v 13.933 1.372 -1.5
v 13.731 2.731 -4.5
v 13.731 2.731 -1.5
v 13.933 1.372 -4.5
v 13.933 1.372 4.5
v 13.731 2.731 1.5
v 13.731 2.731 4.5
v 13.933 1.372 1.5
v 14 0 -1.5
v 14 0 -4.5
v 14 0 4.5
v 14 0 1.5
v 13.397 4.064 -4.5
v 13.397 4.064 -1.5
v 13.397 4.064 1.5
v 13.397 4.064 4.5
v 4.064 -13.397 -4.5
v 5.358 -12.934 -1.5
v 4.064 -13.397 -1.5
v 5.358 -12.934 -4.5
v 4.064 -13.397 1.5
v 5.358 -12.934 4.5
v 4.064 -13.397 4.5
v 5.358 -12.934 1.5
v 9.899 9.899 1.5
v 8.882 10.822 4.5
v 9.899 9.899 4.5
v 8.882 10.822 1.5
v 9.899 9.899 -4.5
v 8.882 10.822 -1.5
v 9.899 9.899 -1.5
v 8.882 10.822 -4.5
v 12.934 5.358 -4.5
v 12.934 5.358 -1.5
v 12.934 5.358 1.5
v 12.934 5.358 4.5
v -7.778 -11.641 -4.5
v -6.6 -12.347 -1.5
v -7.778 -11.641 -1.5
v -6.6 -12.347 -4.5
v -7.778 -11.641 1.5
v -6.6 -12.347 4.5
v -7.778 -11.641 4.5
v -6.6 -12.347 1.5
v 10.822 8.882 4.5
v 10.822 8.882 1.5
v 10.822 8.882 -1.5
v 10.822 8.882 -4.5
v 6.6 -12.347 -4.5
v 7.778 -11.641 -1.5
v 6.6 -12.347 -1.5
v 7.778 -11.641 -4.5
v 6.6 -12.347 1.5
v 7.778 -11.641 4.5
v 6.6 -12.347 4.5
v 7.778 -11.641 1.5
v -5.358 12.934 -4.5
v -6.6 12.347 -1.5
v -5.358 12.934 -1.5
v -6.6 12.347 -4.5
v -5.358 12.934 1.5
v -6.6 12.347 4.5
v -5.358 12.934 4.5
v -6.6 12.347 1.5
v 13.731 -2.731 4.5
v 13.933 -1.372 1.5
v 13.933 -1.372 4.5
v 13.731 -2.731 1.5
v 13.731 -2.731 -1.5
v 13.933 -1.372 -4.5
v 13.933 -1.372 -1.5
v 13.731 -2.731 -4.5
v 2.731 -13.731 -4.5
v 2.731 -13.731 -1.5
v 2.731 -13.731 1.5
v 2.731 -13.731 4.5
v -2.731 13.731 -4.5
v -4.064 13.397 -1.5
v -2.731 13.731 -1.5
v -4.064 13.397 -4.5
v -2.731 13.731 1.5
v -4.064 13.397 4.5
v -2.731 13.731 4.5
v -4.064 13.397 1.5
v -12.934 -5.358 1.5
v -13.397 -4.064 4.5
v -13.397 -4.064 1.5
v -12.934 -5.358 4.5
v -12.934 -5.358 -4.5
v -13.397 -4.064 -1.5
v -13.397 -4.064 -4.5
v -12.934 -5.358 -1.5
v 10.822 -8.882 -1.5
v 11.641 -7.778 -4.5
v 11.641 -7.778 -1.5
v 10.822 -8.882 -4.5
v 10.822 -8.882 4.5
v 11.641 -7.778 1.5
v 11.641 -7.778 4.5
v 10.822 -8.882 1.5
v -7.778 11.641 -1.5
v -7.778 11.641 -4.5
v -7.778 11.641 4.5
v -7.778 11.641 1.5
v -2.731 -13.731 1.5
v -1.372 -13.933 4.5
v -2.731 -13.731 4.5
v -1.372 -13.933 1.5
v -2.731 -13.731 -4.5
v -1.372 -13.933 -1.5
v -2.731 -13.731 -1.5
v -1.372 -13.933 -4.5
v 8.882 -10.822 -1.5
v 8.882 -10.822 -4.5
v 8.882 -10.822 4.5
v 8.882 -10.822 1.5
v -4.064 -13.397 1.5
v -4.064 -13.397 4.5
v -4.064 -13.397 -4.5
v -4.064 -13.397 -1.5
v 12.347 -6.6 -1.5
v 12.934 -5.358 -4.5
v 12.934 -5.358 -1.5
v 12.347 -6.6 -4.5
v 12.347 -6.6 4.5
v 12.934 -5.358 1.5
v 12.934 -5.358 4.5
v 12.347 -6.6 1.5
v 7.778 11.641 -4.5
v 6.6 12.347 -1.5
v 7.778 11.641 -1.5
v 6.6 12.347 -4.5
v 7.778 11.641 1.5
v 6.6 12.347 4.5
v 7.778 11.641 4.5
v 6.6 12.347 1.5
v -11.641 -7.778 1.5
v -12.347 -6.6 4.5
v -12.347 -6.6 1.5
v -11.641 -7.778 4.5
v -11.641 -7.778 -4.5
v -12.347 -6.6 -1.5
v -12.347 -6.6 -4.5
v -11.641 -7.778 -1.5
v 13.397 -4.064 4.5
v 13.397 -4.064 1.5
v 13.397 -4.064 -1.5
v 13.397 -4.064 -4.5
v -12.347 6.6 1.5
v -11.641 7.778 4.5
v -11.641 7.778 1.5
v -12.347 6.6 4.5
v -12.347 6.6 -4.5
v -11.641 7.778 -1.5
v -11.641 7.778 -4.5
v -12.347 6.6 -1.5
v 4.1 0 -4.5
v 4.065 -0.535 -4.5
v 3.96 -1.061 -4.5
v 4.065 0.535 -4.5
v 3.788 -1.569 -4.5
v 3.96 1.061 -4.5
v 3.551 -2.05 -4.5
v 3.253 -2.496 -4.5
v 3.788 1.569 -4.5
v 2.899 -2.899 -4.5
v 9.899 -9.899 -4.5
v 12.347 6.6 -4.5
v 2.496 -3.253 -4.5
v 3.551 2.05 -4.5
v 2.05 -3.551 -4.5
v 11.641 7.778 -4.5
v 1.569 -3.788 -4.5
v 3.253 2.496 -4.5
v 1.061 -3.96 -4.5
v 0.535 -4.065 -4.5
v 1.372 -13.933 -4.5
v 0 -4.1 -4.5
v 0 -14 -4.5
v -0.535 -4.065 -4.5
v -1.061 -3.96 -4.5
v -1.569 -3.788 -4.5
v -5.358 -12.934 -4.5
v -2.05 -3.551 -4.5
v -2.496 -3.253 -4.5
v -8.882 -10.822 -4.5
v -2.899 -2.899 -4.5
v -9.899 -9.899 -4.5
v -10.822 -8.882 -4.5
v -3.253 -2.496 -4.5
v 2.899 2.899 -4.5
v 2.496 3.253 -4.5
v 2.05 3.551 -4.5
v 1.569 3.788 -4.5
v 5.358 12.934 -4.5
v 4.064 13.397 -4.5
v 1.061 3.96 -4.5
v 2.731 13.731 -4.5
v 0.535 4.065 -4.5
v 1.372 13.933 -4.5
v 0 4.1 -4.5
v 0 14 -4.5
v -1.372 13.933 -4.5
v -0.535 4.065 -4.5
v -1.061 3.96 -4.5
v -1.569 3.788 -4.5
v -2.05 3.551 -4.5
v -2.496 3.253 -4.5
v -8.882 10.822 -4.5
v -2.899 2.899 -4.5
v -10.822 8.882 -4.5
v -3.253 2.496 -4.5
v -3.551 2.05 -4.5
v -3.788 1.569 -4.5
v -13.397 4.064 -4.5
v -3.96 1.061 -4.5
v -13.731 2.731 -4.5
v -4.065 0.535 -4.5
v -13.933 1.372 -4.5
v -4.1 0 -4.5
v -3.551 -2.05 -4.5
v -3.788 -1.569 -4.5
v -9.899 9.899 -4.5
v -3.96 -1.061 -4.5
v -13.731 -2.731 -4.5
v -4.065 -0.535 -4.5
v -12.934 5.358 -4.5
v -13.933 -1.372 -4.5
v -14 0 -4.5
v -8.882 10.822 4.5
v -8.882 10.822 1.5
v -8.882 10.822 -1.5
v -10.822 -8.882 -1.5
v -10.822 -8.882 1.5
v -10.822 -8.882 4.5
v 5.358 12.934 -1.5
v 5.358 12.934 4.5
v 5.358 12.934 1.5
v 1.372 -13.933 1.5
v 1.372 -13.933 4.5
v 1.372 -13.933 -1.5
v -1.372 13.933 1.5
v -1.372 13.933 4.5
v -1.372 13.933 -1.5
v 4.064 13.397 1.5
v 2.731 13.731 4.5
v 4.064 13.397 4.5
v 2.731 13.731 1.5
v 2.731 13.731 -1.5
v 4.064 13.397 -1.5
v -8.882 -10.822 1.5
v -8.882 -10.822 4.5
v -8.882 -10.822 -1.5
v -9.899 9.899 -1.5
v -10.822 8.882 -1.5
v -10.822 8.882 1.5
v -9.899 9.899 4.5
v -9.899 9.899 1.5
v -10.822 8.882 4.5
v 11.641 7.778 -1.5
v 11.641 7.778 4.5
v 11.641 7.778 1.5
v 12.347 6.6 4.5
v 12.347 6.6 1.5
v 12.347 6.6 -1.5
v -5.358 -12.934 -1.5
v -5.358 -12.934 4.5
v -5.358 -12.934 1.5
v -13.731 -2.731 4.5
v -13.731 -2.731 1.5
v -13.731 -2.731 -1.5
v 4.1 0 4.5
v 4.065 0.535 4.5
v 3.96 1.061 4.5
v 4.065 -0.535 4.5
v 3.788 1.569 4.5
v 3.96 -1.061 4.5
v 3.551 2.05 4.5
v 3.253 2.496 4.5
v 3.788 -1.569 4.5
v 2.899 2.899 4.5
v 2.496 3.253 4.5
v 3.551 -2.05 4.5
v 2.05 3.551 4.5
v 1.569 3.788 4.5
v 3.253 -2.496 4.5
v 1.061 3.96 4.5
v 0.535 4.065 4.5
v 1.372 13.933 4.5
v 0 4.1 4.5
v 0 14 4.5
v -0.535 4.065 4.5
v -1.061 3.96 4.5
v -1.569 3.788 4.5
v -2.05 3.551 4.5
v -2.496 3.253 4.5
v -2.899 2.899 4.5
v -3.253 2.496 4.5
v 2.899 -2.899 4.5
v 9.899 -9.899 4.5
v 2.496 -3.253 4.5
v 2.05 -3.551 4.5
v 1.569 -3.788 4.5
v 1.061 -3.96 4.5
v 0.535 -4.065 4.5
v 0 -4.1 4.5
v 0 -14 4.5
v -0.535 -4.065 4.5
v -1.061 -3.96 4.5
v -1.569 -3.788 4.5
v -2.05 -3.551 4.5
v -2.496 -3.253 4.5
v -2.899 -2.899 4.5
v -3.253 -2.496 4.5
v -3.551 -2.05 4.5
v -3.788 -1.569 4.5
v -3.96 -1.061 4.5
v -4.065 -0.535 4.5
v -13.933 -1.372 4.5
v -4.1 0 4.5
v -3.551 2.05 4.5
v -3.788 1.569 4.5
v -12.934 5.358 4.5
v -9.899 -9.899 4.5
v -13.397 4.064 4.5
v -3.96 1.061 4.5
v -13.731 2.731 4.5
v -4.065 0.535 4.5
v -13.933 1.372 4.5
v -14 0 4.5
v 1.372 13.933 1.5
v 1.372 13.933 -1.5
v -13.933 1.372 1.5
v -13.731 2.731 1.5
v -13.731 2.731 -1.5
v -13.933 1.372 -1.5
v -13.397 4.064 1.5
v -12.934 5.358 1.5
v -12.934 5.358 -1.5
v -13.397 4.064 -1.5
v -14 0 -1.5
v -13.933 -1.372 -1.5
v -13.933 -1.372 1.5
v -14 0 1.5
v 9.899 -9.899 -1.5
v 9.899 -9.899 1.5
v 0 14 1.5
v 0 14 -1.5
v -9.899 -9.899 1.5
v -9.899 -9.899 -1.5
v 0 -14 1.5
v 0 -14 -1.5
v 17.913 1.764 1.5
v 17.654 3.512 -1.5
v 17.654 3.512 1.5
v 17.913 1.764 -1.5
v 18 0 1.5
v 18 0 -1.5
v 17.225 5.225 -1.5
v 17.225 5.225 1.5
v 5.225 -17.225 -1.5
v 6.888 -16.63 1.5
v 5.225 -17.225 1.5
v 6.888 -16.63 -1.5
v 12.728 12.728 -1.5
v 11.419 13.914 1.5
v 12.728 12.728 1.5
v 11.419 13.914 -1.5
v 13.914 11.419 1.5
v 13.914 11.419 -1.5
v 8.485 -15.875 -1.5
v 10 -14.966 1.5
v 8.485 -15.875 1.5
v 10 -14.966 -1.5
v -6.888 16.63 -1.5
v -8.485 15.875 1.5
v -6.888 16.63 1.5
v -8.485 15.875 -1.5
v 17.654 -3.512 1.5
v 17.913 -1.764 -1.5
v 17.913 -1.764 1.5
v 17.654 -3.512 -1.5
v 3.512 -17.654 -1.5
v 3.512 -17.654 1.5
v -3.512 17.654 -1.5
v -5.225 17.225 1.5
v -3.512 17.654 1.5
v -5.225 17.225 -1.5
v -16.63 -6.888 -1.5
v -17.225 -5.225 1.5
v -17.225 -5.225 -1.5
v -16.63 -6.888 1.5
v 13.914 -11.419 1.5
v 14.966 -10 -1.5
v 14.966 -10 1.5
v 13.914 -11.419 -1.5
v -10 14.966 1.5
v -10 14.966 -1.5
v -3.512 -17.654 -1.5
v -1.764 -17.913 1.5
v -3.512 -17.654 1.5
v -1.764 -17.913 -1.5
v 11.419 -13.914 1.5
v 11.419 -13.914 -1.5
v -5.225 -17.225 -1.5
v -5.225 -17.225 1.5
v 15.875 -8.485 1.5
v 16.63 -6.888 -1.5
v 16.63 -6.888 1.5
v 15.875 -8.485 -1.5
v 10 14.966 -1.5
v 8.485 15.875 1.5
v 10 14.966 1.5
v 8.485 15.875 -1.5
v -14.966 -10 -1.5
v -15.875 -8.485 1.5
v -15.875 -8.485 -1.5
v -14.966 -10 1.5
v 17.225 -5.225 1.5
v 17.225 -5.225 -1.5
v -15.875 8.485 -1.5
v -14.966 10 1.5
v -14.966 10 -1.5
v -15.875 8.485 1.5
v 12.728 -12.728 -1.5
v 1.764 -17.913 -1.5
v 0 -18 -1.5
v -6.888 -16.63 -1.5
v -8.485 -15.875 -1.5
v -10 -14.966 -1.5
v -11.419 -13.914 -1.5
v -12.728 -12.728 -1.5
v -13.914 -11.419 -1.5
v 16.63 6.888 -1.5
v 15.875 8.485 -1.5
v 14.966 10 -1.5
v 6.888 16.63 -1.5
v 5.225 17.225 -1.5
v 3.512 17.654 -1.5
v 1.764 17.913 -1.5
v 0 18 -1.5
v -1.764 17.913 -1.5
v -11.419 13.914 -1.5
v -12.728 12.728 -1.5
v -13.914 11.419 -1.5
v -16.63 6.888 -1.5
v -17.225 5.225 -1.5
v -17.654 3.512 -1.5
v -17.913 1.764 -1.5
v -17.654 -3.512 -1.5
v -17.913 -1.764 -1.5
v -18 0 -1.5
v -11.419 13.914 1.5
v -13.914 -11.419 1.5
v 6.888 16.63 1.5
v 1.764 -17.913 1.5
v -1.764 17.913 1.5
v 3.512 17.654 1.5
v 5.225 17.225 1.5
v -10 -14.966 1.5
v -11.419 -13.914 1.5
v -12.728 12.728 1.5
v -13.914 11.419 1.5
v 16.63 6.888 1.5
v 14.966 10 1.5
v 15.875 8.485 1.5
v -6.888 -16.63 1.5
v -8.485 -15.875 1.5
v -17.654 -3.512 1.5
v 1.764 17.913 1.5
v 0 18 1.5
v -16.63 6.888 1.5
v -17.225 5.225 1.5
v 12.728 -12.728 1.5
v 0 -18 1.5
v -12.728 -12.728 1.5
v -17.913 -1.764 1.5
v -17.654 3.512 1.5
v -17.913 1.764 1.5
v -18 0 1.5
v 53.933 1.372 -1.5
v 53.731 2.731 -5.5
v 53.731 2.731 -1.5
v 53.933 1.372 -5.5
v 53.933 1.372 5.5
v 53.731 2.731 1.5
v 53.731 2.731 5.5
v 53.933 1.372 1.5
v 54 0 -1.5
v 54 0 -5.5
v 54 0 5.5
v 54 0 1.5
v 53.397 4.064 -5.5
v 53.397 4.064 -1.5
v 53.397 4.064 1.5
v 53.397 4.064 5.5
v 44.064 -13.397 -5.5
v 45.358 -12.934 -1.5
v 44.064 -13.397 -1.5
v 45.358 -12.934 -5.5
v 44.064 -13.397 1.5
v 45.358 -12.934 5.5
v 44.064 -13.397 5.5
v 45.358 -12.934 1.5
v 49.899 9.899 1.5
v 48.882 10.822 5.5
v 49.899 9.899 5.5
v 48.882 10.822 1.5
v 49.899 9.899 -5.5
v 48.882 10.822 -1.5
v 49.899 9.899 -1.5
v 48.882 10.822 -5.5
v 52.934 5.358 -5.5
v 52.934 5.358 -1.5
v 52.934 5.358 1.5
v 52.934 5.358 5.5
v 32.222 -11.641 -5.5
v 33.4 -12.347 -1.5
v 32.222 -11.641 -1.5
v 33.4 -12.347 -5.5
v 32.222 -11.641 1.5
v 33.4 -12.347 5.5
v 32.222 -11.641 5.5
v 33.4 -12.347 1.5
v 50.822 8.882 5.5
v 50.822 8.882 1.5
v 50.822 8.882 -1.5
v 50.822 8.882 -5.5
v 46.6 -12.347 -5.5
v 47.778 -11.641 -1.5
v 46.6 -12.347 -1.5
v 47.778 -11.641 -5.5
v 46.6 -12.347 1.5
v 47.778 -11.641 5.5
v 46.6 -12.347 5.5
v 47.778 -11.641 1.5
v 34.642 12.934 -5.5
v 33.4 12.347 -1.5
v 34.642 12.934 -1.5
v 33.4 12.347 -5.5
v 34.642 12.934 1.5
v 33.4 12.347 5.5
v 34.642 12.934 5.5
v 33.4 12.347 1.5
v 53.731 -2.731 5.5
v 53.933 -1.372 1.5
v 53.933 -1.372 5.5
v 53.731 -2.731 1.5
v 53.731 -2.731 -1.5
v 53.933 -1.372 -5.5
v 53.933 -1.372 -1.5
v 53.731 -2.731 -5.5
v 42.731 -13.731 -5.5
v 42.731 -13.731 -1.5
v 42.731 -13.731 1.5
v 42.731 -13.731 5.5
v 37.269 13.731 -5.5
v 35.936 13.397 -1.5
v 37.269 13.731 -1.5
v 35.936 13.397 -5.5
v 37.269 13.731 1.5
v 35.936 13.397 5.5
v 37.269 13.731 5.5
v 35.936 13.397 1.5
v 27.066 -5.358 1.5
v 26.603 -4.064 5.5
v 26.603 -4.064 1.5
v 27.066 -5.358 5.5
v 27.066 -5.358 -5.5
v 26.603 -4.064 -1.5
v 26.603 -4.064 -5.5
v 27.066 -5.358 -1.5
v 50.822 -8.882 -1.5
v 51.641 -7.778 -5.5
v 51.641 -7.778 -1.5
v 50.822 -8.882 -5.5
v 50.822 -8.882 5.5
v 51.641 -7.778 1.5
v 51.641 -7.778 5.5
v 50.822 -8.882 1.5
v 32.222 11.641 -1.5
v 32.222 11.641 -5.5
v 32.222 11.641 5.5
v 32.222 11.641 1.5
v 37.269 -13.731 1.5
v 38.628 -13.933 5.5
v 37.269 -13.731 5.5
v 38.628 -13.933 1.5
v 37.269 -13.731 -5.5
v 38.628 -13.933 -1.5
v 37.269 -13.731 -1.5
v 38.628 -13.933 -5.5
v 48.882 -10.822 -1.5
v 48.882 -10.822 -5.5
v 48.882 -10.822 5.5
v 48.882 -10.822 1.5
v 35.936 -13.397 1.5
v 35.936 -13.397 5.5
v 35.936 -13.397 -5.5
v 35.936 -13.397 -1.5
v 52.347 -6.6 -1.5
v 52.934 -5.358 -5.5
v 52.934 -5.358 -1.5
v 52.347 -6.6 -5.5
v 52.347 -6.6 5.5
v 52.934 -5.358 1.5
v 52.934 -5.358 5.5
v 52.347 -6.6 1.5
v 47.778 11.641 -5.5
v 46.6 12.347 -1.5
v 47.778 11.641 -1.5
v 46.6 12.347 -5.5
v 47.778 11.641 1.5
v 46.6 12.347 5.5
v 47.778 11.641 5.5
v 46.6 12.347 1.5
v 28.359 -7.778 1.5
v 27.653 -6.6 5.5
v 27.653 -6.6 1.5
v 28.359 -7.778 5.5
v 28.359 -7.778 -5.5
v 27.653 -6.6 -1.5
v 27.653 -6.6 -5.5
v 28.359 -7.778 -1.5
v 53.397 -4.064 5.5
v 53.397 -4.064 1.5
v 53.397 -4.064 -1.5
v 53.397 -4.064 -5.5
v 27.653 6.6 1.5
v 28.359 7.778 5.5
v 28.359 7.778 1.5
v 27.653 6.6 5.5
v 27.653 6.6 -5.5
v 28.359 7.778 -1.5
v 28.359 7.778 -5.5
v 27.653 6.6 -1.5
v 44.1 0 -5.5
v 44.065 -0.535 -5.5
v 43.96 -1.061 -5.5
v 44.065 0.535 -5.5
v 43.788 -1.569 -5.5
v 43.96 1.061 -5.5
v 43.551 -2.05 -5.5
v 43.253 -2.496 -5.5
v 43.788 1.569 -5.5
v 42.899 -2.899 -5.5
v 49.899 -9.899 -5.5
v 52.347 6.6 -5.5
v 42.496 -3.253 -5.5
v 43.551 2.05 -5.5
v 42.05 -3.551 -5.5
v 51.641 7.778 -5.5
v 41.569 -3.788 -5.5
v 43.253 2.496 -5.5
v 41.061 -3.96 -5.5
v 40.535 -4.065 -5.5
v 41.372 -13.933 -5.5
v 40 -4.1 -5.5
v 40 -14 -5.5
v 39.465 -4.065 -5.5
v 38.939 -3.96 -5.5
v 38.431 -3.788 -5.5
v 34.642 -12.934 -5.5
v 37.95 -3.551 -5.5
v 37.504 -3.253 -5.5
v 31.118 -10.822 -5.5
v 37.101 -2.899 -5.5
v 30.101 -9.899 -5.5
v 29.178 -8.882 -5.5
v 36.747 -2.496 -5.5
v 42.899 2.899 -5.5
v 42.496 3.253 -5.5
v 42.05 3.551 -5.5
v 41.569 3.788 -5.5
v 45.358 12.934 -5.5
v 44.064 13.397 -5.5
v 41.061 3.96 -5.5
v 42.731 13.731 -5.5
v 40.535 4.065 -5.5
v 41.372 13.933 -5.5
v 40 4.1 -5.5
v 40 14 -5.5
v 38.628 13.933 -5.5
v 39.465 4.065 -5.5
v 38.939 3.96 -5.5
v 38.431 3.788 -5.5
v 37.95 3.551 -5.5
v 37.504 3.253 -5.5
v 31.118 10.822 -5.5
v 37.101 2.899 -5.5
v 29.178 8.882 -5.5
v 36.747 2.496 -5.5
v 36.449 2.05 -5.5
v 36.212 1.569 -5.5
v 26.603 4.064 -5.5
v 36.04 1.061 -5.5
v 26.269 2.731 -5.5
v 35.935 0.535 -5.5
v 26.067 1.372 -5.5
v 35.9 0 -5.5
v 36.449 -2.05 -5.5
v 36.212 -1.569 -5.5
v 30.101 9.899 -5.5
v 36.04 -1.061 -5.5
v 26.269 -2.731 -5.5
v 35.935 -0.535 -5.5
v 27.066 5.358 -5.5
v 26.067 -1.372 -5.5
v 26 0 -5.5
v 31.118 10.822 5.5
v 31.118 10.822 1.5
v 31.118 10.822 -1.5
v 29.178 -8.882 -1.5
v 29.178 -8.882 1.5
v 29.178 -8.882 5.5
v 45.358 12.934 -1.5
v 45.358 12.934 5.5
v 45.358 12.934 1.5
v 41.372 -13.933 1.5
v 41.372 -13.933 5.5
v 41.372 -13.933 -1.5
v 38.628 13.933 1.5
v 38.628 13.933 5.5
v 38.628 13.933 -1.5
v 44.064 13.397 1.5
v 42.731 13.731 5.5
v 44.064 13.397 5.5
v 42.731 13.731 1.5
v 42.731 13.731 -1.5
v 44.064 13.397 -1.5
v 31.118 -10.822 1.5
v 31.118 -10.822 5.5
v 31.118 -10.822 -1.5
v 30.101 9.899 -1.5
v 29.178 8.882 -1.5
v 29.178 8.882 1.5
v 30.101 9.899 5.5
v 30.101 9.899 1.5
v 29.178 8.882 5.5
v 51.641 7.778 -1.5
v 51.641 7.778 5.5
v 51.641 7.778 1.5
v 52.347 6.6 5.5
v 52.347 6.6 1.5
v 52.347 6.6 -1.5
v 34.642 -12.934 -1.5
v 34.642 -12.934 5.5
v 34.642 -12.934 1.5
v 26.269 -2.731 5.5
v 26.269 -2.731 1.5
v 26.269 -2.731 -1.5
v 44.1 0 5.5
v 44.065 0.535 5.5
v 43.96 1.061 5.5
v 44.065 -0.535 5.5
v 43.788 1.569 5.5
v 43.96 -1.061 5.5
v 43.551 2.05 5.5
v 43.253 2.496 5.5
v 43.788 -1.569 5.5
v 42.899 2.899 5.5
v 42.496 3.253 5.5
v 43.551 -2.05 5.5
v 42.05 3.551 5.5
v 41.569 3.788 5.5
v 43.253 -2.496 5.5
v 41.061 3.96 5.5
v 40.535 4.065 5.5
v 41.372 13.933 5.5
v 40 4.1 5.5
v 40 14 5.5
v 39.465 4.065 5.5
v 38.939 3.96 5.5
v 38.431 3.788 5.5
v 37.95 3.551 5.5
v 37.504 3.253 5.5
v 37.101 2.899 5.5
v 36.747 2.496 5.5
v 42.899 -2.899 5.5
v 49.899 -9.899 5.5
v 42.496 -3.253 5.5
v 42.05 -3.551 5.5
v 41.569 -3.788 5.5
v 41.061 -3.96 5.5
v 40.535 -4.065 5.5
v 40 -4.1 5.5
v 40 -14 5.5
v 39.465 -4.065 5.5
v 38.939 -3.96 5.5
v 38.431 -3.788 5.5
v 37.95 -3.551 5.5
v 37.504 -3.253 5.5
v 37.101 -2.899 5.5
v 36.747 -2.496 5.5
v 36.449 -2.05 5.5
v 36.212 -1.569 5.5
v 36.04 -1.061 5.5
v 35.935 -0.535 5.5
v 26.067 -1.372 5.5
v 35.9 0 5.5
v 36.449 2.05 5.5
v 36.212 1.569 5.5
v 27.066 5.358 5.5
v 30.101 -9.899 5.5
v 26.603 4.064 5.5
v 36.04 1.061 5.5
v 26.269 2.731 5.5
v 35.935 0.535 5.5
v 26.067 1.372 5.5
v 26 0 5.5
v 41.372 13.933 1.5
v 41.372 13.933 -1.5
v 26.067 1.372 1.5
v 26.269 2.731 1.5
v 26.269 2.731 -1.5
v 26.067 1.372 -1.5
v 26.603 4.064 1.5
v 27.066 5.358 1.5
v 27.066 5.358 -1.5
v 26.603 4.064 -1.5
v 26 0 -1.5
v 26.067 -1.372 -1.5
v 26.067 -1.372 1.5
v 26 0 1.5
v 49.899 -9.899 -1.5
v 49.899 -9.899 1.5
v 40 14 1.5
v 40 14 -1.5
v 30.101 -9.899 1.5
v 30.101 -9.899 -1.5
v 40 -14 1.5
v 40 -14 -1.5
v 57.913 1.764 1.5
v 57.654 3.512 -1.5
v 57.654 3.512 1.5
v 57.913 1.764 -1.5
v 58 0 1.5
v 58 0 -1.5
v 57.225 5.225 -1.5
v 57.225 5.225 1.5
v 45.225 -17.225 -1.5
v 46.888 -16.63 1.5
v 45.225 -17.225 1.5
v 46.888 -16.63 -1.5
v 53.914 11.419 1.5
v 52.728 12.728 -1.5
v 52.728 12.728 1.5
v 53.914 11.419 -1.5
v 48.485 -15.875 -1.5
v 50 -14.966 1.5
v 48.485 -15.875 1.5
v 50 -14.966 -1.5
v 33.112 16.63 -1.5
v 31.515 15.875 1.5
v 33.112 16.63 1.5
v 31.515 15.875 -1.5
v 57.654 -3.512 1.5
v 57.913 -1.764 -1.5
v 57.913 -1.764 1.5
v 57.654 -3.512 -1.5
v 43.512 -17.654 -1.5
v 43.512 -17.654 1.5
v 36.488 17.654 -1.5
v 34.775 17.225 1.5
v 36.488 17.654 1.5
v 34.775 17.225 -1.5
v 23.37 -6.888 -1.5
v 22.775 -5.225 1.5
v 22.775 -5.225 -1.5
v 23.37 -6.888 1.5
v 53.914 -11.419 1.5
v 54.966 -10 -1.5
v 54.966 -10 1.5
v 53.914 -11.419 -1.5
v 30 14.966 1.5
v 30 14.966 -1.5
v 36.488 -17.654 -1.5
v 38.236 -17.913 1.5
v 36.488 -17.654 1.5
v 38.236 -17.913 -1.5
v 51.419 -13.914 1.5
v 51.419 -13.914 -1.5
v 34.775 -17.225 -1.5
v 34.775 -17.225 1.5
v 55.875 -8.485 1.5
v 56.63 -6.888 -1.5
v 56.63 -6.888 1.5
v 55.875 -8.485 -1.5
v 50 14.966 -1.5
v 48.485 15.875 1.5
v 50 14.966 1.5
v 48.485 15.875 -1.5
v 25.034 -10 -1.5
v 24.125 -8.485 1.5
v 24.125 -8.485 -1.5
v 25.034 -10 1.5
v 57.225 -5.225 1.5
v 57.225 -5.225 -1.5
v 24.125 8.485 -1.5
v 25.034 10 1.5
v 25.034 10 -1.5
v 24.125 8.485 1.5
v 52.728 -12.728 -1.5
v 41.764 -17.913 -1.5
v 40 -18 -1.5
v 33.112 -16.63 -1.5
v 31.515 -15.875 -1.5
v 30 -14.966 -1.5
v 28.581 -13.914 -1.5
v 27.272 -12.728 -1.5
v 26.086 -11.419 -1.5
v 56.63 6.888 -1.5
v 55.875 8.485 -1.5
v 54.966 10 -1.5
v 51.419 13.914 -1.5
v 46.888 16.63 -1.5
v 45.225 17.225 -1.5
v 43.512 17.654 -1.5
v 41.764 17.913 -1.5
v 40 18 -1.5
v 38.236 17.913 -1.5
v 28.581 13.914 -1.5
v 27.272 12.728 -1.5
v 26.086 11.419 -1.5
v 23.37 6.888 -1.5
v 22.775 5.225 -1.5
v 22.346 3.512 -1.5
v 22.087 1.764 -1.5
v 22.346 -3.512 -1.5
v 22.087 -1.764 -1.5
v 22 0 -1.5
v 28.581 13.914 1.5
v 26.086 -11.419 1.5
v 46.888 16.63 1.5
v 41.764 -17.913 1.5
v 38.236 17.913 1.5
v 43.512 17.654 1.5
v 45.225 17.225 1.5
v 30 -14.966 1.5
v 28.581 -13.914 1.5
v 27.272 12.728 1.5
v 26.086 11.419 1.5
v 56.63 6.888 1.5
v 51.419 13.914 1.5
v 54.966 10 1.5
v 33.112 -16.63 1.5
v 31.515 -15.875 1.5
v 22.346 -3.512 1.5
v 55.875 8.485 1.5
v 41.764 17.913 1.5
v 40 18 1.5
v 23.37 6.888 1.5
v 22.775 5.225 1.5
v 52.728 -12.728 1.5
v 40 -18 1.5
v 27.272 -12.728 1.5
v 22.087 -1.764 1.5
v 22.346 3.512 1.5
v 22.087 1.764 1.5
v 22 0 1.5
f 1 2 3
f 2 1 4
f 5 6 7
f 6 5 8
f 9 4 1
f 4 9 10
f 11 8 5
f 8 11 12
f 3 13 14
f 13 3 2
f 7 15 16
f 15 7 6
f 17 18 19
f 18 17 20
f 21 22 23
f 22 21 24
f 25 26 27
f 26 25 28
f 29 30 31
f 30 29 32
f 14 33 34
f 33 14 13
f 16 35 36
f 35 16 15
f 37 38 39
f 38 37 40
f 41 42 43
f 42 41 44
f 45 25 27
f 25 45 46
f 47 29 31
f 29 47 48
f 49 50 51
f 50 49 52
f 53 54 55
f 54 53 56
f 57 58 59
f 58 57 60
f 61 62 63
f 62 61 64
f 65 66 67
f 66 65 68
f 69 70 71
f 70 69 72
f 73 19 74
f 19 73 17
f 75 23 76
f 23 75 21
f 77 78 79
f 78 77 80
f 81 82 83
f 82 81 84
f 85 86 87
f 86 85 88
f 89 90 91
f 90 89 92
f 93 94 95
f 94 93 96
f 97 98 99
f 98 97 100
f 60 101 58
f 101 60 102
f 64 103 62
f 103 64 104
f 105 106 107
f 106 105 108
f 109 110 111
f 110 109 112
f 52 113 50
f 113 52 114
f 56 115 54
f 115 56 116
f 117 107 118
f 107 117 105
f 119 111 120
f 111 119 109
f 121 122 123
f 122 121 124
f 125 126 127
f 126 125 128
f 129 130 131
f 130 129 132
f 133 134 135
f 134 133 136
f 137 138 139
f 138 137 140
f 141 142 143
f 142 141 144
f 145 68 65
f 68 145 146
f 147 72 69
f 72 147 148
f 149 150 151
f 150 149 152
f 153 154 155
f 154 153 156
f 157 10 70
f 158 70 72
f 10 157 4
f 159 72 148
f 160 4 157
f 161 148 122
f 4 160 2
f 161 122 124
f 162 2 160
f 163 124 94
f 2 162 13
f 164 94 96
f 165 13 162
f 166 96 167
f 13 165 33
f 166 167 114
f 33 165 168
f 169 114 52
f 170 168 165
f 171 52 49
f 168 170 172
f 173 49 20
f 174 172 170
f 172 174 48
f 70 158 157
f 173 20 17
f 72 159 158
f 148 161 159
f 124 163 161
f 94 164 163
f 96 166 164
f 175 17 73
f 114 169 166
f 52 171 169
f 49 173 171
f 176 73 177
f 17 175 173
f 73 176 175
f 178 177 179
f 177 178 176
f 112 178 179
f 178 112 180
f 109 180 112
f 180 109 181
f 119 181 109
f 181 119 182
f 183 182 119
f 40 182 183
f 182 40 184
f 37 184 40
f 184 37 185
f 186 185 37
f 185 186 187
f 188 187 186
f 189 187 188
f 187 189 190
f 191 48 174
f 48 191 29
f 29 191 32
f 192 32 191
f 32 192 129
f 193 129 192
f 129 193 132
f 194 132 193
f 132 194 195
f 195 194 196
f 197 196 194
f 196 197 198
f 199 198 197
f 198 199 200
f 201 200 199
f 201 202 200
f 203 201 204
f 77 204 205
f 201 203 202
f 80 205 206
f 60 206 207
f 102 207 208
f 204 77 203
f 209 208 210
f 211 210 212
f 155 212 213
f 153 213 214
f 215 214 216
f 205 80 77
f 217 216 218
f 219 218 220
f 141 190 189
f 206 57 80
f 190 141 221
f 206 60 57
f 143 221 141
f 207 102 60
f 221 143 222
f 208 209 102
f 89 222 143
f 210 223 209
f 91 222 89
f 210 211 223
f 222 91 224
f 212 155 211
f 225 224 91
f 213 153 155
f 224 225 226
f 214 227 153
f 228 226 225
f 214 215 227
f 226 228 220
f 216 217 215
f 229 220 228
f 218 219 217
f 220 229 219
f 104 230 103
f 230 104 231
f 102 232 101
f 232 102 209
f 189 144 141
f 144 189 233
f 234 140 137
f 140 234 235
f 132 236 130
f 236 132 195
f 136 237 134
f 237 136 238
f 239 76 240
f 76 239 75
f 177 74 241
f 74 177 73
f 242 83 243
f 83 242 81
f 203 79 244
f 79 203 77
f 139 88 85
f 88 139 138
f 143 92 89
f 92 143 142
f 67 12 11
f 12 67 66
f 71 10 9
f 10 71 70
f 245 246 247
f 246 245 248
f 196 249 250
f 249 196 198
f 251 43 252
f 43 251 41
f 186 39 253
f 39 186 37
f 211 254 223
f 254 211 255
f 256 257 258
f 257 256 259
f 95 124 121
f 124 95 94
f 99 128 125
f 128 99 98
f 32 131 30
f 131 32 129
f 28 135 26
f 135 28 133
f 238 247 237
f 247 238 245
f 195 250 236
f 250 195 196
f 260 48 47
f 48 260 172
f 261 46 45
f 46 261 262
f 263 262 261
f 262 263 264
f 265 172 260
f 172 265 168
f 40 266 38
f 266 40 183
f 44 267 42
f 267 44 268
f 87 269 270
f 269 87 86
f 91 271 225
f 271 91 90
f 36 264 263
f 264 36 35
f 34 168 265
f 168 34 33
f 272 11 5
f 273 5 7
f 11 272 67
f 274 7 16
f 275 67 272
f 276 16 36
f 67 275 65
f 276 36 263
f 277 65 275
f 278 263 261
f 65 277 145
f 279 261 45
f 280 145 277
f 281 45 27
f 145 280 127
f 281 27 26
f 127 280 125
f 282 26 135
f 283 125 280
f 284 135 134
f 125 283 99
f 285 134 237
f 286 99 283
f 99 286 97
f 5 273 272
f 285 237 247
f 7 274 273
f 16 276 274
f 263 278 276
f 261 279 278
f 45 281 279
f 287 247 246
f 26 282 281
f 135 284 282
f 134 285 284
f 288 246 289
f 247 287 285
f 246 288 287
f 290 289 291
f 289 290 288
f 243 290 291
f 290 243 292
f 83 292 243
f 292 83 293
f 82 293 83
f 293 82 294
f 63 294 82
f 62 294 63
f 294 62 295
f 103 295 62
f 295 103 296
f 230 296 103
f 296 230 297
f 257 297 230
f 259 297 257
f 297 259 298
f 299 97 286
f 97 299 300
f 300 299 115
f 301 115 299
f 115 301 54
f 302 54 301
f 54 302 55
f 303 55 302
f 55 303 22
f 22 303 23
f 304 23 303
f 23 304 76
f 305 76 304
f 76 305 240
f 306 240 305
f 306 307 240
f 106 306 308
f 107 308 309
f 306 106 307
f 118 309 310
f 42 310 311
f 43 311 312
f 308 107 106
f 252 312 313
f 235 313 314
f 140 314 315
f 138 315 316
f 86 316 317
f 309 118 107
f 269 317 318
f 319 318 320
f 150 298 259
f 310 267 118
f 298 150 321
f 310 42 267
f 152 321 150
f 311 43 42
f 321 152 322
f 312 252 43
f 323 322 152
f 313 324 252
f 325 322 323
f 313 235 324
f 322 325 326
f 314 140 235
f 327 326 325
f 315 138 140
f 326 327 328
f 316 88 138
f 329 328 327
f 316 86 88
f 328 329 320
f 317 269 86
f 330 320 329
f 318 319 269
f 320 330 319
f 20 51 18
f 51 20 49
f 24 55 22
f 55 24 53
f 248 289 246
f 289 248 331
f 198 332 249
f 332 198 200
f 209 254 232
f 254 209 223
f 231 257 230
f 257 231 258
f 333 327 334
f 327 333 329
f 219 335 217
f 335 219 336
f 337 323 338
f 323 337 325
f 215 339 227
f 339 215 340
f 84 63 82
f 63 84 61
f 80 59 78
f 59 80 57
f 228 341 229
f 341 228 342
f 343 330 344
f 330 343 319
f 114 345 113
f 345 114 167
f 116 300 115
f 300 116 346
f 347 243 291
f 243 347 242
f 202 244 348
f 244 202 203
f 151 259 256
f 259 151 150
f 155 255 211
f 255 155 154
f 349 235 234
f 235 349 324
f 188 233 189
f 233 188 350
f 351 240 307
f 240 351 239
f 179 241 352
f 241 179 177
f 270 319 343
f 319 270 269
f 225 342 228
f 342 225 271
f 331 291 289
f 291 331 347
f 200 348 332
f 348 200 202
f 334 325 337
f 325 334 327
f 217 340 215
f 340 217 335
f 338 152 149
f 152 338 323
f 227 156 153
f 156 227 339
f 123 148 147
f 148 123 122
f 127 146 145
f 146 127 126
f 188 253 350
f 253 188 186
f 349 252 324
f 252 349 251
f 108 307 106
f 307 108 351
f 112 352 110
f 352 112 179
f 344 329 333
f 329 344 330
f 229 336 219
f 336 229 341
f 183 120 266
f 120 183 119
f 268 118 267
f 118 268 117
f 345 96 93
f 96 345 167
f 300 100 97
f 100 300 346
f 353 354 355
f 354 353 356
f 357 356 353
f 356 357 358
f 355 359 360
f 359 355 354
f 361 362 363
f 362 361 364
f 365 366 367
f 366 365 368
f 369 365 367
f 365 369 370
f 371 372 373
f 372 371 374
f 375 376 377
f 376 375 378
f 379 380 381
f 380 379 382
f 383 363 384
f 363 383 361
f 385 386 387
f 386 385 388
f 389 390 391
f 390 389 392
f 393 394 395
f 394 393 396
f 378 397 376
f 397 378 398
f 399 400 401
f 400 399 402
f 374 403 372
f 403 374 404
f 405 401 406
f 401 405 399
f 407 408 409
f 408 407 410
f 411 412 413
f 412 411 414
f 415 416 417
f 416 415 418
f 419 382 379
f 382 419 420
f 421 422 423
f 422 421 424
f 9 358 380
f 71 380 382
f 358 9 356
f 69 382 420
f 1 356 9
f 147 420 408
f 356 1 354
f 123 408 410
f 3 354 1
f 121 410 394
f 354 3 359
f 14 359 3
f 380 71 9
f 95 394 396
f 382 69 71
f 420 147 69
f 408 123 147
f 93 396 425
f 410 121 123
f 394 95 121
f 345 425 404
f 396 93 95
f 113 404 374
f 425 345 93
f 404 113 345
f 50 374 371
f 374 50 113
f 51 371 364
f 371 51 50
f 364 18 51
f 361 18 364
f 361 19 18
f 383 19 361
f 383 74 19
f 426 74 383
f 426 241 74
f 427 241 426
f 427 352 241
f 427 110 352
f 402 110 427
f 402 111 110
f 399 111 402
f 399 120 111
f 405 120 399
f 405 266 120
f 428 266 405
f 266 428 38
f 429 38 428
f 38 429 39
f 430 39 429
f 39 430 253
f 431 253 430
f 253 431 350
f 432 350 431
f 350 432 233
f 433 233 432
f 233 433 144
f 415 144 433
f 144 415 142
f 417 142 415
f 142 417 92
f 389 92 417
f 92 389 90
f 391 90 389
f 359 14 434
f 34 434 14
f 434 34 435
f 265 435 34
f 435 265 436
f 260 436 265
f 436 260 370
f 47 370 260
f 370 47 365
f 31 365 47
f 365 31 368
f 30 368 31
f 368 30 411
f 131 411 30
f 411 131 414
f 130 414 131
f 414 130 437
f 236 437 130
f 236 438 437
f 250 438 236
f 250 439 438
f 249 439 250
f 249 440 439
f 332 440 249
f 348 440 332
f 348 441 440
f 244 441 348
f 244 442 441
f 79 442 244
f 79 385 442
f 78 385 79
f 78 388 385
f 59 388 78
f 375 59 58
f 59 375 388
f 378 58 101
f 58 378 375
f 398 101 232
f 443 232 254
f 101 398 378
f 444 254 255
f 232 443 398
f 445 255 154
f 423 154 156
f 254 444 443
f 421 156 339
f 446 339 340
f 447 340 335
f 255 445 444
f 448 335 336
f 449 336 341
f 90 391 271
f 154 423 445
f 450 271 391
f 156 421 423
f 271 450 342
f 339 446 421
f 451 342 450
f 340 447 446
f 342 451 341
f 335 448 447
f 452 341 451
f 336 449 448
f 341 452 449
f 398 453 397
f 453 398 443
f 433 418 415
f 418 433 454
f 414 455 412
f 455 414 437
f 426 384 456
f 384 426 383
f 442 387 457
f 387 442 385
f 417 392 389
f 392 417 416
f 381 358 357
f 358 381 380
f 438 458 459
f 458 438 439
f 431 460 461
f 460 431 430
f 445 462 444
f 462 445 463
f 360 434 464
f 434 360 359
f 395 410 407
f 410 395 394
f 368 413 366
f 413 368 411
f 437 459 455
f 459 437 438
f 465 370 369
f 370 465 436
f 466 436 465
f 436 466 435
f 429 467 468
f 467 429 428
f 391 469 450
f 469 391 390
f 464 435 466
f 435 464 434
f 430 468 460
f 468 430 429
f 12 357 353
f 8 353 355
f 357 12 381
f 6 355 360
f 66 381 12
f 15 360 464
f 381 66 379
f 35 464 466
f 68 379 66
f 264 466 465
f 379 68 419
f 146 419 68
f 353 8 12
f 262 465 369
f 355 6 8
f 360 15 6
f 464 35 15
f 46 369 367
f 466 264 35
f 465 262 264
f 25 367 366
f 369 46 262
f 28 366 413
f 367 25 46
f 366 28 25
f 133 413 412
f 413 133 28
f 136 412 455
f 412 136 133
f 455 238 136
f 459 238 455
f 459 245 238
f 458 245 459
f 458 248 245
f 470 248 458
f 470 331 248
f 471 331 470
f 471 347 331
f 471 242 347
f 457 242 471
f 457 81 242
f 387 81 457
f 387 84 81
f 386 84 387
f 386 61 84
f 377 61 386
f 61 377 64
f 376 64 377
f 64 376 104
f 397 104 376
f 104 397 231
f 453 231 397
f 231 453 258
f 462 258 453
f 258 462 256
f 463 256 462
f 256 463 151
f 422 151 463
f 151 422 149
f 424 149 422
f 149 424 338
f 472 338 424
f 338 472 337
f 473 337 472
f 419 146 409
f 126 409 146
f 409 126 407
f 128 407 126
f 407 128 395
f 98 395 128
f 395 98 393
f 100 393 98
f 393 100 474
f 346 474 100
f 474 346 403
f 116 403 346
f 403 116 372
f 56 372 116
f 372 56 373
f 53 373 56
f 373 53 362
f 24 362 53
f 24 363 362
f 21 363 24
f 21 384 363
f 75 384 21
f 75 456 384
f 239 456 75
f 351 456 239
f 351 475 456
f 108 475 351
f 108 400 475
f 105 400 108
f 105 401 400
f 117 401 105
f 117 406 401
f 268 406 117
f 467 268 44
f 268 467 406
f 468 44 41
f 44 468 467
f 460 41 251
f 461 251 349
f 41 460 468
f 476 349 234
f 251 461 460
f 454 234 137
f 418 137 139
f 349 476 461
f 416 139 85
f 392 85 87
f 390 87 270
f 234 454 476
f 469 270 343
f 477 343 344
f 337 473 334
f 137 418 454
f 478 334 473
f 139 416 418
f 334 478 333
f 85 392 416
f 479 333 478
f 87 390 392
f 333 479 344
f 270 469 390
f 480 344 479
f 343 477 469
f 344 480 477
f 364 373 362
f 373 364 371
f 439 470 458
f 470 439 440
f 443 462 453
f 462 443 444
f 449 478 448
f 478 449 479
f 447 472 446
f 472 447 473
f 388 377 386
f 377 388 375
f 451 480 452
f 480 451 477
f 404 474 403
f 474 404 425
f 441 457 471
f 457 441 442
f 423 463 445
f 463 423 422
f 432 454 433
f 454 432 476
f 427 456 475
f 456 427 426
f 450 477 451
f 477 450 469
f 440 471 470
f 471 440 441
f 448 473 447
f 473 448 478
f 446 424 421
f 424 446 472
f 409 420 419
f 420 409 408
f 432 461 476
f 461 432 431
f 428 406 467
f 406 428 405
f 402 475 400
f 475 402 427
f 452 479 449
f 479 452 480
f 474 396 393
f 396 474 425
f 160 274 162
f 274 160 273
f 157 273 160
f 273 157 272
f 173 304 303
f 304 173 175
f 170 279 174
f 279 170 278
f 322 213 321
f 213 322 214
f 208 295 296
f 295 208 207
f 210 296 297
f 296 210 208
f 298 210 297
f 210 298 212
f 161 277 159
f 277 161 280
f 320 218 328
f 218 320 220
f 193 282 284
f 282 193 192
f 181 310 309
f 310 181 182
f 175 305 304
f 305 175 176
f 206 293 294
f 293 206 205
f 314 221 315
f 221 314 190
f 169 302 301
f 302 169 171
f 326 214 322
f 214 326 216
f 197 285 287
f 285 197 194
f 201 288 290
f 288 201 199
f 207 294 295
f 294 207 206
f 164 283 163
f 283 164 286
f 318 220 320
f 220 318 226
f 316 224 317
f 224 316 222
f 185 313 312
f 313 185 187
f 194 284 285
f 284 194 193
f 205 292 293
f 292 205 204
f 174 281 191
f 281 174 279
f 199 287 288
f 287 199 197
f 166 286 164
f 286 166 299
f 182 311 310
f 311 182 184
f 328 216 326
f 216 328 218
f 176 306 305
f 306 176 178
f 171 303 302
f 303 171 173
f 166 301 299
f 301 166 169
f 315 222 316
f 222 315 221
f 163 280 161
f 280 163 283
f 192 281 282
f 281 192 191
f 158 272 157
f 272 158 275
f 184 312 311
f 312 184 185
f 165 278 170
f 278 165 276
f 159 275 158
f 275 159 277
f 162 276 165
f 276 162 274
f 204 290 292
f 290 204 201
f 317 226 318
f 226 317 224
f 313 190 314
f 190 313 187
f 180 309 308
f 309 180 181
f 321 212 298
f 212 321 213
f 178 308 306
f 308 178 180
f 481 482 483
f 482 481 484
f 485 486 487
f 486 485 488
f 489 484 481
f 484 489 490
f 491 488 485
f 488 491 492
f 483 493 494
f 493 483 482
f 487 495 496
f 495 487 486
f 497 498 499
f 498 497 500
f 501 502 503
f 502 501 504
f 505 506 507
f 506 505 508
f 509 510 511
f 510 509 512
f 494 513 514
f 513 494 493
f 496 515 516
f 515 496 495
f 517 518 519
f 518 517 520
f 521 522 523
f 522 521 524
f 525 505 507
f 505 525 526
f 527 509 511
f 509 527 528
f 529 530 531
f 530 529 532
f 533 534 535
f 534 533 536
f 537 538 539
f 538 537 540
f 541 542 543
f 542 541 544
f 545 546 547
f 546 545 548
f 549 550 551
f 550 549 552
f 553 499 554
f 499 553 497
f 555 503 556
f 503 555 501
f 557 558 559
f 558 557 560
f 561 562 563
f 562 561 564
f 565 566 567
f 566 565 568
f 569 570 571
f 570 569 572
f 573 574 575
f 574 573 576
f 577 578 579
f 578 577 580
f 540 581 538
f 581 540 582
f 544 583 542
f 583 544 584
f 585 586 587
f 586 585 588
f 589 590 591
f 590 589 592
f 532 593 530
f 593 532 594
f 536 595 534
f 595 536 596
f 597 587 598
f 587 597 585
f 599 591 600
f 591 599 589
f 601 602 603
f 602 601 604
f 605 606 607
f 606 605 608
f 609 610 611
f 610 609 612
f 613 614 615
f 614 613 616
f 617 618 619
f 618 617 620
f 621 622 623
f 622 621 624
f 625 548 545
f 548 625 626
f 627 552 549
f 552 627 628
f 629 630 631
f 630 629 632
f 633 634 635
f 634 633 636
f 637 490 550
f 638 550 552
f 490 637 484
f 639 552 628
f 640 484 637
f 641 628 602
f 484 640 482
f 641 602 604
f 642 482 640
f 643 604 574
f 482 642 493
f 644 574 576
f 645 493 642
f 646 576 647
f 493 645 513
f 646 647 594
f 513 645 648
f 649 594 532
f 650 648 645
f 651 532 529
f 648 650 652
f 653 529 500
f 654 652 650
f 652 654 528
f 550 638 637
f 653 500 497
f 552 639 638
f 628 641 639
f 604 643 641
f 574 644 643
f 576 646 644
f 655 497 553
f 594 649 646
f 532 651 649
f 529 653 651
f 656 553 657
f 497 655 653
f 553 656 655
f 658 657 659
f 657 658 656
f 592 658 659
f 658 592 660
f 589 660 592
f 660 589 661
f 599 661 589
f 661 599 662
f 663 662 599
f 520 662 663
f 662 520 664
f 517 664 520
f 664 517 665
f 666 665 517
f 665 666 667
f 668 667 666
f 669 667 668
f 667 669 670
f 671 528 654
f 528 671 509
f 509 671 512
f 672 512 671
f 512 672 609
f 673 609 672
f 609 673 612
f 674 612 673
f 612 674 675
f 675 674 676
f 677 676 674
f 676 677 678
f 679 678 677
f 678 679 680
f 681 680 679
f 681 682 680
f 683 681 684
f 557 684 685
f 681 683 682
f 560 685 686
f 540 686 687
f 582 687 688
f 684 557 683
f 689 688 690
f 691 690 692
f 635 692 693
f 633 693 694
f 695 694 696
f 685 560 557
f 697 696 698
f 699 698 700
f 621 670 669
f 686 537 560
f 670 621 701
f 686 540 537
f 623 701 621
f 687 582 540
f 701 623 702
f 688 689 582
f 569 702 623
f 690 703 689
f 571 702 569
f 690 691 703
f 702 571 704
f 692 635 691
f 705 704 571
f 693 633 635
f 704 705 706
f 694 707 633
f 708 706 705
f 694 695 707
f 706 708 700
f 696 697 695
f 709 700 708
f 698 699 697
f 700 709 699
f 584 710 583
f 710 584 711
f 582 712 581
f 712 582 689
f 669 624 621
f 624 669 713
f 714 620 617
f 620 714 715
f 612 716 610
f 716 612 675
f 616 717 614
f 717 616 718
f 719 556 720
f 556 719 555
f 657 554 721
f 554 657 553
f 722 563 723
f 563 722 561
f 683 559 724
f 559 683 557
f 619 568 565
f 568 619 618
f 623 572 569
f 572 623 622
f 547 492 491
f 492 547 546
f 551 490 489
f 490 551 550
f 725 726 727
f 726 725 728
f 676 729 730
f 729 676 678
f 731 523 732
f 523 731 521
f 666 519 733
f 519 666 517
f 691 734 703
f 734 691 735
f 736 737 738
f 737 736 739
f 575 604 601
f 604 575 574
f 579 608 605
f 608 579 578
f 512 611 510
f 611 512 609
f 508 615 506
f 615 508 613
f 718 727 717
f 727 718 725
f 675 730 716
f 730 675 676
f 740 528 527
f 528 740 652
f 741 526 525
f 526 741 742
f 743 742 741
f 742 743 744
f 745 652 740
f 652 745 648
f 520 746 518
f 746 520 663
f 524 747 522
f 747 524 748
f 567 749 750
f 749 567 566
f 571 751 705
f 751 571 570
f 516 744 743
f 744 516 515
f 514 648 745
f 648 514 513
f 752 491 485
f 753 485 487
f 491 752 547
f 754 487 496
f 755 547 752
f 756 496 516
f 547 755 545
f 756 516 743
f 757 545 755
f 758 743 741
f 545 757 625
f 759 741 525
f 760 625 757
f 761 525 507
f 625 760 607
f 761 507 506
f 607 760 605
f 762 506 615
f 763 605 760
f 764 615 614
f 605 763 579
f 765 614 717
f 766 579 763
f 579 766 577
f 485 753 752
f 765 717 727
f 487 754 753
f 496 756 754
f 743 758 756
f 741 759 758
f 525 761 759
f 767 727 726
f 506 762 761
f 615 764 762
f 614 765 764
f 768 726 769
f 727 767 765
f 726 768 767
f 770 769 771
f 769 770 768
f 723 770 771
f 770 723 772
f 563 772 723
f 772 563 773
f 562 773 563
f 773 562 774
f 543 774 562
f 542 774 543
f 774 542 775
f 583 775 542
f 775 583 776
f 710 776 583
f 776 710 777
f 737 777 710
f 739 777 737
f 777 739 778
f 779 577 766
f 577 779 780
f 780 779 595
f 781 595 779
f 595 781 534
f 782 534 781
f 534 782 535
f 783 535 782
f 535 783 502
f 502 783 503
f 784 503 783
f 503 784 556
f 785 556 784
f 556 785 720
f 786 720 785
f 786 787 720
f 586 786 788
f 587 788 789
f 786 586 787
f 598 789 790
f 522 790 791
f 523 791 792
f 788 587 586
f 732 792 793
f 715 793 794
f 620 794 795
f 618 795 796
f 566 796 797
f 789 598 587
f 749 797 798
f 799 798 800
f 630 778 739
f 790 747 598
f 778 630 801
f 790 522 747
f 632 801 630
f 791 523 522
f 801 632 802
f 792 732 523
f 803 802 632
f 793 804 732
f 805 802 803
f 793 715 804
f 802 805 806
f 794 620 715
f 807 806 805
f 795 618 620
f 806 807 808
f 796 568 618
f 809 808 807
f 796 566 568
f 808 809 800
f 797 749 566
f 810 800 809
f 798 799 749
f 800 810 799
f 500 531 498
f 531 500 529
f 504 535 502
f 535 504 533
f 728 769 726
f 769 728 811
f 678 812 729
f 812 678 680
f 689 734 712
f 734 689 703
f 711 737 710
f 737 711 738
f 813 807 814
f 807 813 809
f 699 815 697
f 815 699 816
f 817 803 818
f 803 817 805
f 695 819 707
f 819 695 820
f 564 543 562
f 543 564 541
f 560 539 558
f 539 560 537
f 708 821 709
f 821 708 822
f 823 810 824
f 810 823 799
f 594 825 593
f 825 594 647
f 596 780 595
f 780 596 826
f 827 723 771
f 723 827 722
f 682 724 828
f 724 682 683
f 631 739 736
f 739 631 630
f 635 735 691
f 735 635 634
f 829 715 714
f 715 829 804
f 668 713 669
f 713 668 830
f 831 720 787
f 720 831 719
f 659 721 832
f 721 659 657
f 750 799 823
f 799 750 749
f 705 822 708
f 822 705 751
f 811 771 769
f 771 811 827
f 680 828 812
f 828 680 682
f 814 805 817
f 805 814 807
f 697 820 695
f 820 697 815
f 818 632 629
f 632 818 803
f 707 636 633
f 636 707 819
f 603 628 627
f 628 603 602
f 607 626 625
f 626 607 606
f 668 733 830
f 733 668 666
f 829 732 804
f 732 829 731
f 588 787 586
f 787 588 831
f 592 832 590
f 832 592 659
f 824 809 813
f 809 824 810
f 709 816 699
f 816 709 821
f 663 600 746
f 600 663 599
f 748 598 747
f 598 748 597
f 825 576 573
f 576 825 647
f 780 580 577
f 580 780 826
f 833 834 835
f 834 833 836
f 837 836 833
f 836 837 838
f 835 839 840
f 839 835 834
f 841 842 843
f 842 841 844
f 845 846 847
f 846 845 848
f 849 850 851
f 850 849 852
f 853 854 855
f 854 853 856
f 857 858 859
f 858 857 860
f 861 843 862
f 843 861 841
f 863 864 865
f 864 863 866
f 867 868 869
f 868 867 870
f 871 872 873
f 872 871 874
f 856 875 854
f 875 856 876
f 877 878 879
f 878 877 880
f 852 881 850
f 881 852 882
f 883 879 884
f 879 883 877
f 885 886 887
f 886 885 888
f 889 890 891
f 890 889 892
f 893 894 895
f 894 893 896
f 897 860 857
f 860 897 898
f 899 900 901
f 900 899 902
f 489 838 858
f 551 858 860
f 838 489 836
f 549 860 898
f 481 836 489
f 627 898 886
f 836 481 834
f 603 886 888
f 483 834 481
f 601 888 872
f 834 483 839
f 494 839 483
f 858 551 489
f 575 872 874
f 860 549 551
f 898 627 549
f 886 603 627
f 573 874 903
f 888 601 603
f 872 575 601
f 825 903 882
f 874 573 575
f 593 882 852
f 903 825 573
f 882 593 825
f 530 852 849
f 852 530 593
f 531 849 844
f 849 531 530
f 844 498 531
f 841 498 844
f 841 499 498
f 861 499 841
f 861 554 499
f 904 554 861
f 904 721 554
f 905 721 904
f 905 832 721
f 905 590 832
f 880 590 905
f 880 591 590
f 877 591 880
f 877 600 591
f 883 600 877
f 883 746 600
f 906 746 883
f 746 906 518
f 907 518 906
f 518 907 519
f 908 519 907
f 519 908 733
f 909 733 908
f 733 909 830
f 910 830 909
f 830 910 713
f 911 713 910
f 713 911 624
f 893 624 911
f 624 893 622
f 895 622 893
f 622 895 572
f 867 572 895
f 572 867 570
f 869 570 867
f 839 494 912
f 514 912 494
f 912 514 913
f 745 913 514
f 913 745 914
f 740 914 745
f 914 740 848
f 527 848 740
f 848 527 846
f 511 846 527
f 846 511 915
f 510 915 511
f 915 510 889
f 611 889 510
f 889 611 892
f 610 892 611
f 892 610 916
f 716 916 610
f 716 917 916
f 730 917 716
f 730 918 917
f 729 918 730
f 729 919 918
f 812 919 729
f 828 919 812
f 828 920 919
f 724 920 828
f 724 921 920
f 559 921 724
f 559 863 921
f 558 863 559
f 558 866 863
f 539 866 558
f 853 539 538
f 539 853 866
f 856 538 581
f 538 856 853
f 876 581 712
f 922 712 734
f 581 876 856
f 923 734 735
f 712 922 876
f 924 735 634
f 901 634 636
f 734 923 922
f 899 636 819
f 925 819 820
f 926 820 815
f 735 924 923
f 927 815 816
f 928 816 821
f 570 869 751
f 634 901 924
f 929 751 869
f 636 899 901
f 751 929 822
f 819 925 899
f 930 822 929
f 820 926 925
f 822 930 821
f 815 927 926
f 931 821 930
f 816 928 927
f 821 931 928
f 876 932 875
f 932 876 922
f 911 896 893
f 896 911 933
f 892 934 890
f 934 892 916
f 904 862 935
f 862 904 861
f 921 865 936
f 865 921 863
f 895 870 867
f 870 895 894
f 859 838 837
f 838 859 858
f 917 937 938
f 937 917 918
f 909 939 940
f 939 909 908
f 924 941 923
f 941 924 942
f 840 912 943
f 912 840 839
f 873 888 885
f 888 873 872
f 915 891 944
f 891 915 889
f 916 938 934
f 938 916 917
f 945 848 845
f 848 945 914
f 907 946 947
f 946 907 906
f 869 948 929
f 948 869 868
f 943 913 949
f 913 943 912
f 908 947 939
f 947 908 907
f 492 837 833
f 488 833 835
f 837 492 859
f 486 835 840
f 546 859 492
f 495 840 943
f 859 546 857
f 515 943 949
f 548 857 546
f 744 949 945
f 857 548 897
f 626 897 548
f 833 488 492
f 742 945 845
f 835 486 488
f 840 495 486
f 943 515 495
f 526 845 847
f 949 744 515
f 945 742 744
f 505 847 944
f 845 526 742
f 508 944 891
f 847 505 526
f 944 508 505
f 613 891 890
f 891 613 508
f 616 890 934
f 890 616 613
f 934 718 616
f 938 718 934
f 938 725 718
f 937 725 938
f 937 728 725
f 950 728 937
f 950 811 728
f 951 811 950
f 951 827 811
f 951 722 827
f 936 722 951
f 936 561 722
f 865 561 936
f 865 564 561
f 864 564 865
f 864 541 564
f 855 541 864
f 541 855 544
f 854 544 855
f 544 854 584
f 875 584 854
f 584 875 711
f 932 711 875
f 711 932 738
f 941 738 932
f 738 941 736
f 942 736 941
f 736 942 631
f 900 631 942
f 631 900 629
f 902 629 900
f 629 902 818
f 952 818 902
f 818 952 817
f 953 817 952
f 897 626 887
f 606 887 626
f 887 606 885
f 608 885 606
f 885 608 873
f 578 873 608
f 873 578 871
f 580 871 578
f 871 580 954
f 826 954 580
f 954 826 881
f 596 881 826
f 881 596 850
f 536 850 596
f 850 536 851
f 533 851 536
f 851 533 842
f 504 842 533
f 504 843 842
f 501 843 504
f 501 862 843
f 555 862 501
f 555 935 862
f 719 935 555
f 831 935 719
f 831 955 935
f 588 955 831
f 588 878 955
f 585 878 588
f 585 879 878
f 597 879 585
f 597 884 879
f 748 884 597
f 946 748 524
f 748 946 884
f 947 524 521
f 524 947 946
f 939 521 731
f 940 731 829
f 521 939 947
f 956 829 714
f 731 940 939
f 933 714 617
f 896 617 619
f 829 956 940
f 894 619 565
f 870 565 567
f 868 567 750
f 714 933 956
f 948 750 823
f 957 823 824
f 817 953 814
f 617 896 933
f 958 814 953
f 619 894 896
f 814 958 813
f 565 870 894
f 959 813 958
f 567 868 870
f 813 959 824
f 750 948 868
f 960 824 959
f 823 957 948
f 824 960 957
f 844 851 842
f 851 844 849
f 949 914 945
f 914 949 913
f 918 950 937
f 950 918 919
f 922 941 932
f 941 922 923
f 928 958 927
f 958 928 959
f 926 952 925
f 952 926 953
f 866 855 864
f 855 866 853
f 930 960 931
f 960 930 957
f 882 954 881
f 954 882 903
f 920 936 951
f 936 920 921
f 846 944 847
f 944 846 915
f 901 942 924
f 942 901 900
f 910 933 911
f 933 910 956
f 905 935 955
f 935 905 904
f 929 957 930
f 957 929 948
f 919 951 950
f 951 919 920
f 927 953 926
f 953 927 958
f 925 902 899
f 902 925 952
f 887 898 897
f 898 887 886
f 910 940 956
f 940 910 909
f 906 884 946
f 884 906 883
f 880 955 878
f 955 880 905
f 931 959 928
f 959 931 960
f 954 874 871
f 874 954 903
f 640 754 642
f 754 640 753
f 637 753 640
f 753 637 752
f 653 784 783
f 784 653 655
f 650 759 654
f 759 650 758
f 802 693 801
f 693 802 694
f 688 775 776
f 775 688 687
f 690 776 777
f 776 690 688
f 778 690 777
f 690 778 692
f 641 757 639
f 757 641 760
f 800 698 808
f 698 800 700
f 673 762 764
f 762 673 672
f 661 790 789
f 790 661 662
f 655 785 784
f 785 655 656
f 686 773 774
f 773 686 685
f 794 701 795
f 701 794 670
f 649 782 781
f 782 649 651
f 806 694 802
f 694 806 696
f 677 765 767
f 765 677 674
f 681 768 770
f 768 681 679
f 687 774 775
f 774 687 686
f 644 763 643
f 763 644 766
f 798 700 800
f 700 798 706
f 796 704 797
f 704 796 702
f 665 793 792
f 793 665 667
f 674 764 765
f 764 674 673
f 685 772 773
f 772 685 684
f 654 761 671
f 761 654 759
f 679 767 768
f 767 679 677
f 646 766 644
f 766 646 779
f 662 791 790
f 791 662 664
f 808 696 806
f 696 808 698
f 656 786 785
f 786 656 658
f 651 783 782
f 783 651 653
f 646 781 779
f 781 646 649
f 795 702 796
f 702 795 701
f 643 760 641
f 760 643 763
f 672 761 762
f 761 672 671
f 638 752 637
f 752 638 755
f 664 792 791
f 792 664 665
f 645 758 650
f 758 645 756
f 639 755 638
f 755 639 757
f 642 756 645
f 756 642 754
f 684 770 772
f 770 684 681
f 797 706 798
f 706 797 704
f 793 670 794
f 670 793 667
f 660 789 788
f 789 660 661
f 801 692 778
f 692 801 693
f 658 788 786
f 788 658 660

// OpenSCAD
/*
 * CD/DVD Version - Bearing Housers
 * Adapted for larger central hub (CD 15mm hole) and slightly different scale.
 *
 * Print with high precision on the bore (see main printing guide).
 */

module cd_dvd_bearing_houser(od=28, id=8.2, h=9, flange_d=36) {
    difference() {
        union() {
            cylinder(d=od, h=h, center=true, $fn=64);
            cylinder(d=flange_d, h=3, center=true, $fn=64);
        }
        cylinder(d=id, h=h+2, center=true, $fn=48);
    }
}

// Upper and lower versions
translate([0, 0, 0])   cd_dvd_bearing_houser(h=9);
translate([40, 0, 0])  cd_dvd_bearing_houser(h=11);  // thicker lower
